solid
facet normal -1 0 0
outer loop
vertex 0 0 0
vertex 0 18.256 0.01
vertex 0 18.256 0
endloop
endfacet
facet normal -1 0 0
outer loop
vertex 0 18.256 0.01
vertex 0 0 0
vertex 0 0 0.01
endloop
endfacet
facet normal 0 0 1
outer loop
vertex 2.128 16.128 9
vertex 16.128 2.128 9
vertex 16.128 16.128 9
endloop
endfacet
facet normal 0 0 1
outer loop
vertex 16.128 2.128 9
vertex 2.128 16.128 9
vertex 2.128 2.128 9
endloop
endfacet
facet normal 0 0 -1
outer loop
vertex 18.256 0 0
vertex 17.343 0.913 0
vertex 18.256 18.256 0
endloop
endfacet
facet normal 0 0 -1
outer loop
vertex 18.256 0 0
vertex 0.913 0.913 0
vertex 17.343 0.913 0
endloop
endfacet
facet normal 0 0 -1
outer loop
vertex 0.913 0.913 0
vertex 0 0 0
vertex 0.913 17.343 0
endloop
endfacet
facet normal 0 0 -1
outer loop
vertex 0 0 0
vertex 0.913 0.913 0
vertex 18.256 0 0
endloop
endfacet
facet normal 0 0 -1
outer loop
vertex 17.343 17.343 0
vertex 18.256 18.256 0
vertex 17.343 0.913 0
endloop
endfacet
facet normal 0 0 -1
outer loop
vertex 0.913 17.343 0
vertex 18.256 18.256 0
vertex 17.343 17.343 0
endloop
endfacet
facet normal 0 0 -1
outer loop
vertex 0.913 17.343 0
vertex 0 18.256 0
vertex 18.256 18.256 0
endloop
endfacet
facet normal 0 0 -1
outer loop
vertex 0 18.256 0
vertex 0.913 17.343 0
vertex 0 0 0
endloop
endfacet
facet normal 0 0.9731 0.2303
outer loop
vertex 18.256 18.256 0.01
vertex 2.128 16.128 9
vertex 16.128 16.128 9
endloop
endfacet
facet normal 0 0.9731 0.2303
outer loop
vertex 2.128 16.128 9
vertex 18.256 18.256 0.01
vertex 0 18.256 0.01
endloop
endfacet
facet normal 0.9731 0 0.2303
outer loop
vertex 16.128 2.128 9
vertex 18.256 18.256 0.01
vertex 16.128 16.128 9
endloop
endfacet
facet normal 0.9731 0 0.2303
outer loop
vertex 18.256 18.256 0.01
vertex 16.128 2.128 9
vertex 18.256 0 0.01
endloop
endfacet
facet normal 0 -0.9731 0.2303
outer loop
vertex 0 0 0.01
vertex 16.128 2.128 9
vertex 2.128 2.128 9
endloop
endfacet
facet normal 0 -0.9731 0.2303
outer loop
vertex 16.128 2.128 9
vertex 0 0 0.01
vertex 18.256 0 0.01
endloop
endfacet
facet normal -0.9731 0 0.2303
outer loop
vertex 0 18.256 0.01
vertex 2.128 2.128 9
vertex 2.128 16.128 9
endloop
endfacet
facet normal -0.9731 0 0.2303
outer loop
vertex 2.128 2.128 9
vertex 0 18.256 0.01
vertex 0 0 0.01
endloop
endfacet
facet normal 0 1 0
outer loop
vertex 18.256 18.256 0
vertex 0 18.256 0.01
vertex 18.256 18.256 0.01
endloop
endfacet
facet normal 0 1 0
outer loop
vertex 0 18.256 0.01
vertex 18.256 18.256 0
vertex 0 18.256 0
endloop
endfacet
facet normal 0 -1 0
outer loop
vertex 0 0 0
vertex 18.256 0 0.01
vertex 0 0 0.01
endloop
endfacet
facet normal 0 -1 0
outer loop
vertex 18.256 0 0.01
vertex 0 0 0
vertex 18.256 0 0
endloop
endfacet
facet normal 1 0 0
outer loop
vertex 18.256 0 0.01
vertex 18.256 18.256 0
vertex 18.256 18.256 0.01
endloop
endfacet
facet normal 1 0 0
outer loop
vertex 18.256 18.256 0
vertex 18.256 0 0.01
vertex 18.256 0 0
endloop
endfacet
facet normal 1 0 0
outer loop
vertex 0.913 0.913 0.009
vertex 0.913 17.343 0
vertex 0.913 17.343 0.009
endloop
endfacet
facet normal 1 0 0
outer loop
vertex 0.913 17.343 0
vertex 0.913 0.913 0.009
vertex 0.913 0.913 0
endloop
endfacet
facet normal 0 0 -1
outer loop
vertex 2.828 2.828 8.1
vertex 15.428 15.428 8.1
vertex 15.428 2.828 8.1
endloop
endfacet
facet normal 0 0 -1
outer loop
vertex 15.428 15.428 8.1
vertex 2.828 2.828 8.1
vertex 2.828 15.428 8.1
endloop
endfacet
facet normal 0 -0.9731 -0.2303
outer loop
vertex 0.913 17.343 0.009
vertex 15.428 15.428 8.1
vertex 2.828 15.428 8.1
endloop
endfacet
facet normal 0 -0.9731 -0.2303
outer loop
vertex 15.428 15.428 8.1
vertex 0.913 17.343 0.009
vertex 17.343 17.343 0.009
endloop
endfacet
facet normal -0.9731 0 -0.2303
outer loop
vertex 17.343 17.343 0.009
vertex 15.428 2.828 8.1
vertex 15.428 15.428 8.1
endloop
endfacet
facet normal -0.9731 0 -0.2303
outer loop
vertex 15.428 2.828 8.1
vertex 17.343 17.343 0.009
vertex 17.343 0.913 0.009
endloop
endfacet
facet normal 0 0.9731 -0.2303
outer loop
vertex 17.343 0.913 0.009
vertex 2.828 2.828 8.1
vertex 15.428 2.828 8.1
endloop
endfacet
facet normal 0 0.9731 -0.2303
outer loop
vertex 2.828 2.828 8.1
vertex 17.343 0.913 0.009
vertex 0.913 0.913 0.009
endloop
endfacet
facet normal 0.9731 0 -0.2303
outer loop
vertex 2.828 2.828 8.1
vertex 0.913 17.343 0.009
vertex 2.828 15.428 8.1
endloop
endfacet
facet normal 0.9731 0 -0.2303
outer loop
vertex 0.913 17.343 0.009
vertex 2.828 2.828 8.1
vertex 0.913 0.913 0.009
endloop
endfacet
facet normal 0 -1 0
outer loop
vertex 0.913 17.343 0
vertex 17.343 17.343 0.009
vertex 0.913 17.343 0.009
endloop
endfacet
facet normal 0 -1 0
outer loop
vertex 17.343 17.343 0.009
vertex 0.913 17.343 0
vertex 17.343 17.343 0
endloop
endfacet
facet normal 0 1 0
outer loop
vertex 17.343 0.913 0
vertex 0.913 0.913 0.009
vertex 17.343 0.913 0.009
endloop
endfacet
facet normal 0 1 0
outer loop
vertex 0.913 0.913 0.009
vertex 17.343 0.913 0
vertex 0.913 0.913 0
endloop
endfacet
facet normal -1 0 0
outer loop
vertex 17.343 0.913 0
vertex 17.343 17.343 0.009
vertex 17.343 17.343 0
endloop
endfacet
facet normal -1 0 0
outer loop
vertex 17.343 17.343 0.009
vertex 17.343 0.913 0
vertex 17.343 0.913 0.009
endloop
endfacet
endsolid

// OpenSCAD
// DCS Row 2 key:
// actual length and width: 0.71875 inch (3/4 - 1/32)
// == 18.25625 mm
// 3/4 is 19.0500 mm (total space required per key)
// top is ~ 13mm wide x 14mm deep

// one 1x key actual space reserved for that key
keydist = 19.05;


module dcs_keyshape( topwidth, botwidth, keyheight, x, y ) {
    
    //scalemult = ((1 - (topwidth/botwidth)) / keyheight);
    // echo(scalemult);
    // linear_extrude( height = (keyheight), scale(h) = (1 - (h * scalemult)) ) {
    //     // echo([botwidth * x, botwidth * y]);
    //     square( size = [botwidth * x, botwidth * y], r = 1, center = true );
    // }

    hull(){
        linear_extrude(height = 0.01){
            square( size = [botwidth * x, botwidth * y], r = 1, center = true );
        }
        translate( [0, 0, keyheight - 0.01] ) {
            linear_extrude( height = 0.01 ){
                square( size = [topwidth * x, topwidth * y], r = 1, center = true );
            }
        }
    }
}

module dcs_full_keycap( topwidth, botwidth, keyheight, x, y ){
    translate( [(botwidth * x) / 2, (botwidth * y) / 2, 0] ) { // recenter
        difference(){
            dcs_keyshape( topwidth, botwidth, keyheight, x, y );
            scale( [0.9, 0.9, 0.9] ) { // totally inaccurate keycap thickness!
                dcs_keyshape( topwidth, botwidth, keyheight, x, y );
            }
        }
        
    }
}

// Example:
// dcs_r2( x = 2 )      // 2x wide, 1x tall
// dcs_r2( y = 1.75 )   // 1.75x tall, 1x wide
module dcs_r2( x = 1, y = 1 ) {
    dcs_full_keycap( topwidth = 14, botwidth = 18.25625, keyheight = 9, x = x, y = y );
}

dcs_r2();
